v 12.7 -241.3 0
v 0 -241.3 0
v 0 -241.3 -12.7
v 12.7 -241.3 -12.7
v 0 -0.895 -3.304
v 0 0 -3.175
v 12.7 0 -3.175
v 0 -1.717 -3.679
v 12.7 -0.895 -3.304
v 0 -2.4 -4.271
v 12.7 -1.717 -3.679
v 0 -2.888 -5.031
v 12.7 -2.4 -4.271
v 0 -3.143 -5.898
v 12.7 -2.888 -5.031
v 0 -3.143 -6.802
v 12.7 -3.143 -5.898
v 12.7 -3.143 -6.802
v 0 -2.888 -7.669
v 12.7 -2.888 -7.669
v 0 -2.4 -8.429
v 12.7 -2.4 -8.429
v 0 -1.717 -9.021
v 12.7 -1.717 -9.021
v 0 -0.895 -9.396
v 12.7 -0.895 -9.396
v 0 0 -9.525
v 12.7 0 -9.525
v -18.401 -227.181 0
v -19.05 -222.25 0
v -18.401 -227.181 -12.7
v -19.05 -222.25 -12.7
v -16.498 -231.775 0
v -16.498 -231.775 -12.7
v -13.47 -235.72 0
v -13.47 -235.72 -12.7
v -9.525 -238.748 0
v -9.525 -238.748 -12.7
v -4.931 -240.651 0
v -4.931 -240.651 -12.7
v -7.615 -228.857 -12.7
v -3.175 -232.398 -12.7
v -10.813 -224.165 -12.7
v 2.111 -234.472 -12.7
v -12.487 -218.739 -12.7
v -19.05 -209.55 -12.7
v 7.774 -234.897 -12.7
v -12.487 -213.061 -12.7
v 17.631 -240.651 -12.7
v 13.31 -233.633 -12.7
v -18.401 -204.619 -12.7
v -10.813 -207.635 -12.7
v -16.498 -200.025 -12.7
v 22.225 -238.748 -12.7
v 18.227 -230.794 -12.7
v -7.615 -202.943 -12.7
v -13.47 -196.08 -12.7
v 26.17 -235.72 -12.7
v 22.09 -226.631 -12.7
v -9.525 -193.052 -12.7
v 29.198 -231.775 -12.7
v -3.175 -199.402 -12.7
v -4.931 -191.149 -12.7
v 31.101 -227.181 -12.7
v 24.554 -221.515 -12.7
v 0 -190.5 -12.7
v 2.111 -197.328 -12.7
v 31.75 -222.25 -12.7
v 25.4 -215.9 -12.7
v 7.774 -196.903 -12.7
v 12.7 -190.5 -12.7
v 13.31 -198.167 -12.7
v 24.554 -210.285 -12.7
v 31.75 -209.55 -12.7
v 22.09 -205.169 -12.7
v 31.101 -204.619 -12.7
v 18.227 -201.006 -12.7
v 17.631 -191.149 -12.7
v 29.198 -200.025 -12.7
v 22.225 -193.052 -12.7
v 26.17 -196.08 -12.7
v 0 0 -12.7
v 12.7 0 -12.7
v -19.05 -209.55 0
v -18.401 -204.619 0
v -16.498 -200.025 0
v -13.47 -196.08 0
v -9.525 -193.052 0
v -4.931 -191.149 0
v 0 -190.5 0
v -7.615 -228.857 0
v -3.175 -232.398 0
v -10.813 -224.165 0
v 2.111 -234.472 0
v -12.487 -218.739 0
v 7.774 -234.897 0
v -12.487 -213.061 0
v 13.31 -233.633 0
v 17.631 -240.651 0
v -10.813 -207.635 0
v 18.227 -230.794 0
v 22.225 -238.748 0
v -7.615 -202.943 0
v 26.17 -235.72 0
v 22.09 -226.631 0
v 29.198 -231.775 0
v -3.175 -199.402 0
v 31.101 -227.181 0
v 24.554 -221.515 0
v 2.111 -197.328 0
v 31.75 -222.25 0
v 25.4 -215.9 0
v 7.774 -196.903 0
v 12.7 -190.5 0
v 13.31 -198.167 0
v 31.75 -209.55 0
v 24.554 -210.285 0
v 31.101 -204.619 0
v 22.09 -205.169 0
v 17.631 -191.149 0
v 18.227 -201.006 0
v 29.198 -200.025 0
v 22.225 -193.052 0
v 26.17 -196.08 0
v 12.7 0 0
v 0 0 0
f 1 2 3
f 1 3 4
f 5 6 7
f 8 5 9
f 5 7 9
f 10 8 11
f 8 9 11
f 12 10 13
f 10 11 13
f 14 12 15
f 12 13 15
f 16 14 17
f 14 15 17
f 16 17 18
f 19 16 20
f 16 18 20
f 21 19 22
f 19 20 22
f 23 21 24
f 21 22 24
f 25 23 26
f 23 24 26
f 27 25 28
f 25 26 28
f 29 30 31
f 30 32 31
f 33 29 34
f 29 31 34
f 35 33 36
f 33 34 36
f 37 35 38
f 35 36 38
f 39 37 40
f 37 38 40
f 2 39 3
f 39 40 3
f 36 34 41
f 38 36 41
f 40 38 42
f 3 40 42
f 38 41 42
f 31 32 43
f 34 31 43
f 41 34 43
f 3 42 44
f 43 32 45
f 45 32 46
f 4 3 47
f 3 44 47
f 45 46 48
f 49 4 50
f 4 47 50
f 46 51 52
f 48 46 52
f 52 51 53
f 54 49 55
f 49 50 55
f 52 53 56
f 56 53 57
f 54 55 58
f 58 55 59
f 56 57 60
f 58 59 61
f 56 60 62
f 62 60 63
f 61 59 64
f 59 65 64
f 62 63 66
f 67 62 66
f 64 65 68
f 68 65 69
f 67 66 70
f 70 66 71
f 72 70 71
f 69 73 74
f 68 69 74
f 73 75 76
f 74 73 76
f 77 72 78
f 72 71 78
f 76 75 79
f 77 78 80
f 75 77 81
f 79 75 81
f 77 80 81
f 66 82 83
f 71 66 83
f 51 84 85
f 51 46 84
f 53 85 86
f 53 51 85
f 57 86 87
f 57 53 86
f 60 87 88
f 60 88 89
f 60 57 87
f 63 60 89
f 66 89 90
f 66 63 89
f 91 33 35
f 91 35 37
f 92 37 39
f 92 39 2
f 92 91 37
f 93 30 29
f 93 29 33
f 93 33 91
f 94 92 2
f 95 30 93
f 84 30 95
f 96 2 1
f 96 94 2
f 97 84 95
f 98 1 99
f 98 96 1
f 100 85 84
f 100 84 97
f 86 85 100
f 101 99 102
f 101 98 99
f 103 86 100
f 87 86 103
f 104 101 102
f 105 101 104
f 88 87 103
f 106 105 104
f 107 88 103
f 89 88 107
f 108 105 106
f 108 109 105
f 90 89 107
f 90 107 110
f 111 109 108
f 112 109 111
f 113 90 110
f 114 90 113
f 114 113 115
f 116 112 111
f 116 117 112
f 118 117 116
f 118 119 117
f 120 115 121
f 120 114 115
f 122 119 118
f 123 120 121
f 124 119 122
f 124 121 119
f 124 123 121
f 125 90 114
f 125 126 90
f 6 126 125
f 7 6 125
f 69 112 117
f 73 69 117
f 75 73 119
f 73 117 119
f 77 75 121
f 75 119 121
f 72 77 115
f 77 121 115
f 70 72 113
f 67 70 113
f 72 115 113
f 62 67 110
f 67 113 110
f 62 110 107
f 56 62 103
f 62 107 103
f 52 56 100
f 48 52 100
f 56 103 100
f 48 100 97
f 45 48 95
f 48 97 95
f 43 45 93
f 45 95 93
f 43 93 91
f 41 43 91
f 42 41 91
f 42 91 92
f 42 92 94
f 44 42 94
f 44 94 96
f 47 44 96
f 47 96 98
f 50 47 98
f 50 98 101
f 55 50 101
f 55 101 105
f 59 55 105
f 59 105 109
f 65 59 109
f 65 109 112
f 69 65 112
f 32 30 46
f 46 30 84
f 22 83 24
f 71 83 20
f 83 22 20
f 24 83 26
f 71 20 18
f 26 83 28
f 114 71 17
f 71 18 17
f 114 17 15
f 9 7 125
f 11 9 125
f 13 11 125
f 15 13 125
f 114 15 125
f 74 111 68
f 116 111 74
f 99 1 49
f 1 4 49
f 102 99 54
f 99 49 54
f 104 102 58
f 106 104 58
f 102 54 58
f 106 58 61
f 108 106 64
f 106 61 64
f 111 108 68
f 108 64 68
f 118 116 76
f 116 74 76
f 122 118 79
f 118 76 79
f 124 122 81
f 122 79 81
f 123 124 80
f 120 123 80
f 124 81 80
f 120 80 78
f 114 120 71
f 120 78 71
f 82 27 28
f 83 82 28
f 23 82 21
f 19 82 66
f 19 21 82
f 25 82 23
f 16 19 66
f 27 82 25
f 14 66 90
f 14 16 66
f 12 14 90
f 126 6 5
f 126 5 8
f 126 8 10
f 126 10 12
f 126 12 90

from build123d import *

# Parameters (mm, degrees)
F0_W     = 12.7
F0_H     = 12.7
F1_DEPTH = 190.5
F2_W     = 50.8
F2_H     = 50.8
F3_DEPTH = 12.7
F4_R     = 19.05
F5_DEPTH = 12.701
F6_R     = 19.04999
F7_R     = 3.175
F8_DEPTH = 31.751


# Not quite as in the source:
# - a fillet or chamfer is up to 0.001 mm smaller than in the source, because OpenCascade refuses the exact size


with BuildPart() as f1:
    # F0 (on Front) → F1 (new body)
    with BuildSketch(Plane.XZ):
        with Locations((6.35, -6.35)):
            Rectangle(F0_W, F0_H)
    extrude(amount=F1_DEPTH)

    # F2 (on face) → F3 (join)
    with BuildSketch(Plane.XY):
        with Locations((6.35, -215.9)):
            Rectangle(F2_W, F2_H)
    extrude(amount=-F3_DEPTH)

    # F4 (on face) → F5 (cut, through all)
    with BuildSketch(Plane.XY):
        with Locations((6.35, -215.9)):
            Circle(F4_R)
    extrude(amount=-F5_DEPTH, mode=Mode.SUBTRACT)

    # F6 (radius 19.05 in the source; OpenCascade refuses exactly that, so slightly less here)
    f6_edges = [f1.edges().sort_by_distance(p)[0] for p in [
        (31.75, -241.3, -6.35),
        (31.75, -190.5, -6.35),
        (-19.05, -241.3, -6.35),
        (-19.05, -190.5, -6.35),
    ]]
    fillet(f6_edges, radius=F6_R)

    # F7 (on face) → F8 (cut, through all)
    with BuildSketch(Plane.YZ.offset(12.7)):
        with Locations((0, -6.35)):
            Circle(F7_R)
    extrude(amount=-F8_DEPTH, mode=Mode.SUBTRACT)


solid = f1.part
